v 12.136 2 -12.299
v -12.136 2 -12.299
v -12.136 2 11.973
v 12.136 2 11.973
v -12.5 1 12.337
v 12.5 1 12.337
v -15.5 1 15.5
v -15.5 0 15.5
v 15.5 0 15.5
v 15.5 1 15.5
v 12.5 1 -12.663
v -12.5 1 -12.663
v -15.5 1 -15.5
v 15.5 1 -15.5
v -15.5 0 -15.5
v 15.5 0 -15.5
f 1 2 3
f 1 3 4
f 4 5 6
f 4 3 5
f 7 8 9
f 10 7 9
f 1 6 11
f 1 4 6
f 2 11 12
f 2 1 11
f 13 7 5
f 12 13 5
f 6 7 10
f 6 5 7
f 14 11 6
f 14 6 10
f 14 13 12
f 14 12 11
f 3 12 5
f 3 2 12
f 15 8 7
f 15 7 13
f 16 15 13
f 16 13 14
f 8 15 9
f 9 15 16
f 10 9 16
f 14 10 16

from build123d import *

# Parameters (mm, degrees)
SKETCH8_W            = 31
SKETCH8_H            = 31
BOSS_EXTRUDE4_DEPTH  = 1
SKETCH16_W           = 25
SKETCH16_H           = 25
BOSS_EXTRUDE11_DEPTH = 1
BOSS_EXTRUDE11_TAPER = 20


with BuildPart() as part:
    # Sketch8 → Boss-Extrude4 (new body)
    with BuildSketch(Plane(origin=(0, 0, 0), x_dir=(1, 0, 0), z_dir=(0, 1, 0))):
        Rectangle(SKETCH8_W, SKETCH8_H)
    extrude(amount=BOSS_EXTRUDE4_DEPTH)

    # Sketch16 → Boss-Extrude11 (add)
    with BuildSketch(Plane(origin=(0, 1, 0), x_dir=(1, 0, 0), z_dir=(0, 1, 0))):
        with Locations((0, 0.163009042)):
            Rectangle(SKETCH16_W, SKETCH16_H)
    extrude(amount=BOSS_EXTRUDE11_DEPTH, taper=BOSS_EXTRUDE11_TAPER)


solid = part.part
